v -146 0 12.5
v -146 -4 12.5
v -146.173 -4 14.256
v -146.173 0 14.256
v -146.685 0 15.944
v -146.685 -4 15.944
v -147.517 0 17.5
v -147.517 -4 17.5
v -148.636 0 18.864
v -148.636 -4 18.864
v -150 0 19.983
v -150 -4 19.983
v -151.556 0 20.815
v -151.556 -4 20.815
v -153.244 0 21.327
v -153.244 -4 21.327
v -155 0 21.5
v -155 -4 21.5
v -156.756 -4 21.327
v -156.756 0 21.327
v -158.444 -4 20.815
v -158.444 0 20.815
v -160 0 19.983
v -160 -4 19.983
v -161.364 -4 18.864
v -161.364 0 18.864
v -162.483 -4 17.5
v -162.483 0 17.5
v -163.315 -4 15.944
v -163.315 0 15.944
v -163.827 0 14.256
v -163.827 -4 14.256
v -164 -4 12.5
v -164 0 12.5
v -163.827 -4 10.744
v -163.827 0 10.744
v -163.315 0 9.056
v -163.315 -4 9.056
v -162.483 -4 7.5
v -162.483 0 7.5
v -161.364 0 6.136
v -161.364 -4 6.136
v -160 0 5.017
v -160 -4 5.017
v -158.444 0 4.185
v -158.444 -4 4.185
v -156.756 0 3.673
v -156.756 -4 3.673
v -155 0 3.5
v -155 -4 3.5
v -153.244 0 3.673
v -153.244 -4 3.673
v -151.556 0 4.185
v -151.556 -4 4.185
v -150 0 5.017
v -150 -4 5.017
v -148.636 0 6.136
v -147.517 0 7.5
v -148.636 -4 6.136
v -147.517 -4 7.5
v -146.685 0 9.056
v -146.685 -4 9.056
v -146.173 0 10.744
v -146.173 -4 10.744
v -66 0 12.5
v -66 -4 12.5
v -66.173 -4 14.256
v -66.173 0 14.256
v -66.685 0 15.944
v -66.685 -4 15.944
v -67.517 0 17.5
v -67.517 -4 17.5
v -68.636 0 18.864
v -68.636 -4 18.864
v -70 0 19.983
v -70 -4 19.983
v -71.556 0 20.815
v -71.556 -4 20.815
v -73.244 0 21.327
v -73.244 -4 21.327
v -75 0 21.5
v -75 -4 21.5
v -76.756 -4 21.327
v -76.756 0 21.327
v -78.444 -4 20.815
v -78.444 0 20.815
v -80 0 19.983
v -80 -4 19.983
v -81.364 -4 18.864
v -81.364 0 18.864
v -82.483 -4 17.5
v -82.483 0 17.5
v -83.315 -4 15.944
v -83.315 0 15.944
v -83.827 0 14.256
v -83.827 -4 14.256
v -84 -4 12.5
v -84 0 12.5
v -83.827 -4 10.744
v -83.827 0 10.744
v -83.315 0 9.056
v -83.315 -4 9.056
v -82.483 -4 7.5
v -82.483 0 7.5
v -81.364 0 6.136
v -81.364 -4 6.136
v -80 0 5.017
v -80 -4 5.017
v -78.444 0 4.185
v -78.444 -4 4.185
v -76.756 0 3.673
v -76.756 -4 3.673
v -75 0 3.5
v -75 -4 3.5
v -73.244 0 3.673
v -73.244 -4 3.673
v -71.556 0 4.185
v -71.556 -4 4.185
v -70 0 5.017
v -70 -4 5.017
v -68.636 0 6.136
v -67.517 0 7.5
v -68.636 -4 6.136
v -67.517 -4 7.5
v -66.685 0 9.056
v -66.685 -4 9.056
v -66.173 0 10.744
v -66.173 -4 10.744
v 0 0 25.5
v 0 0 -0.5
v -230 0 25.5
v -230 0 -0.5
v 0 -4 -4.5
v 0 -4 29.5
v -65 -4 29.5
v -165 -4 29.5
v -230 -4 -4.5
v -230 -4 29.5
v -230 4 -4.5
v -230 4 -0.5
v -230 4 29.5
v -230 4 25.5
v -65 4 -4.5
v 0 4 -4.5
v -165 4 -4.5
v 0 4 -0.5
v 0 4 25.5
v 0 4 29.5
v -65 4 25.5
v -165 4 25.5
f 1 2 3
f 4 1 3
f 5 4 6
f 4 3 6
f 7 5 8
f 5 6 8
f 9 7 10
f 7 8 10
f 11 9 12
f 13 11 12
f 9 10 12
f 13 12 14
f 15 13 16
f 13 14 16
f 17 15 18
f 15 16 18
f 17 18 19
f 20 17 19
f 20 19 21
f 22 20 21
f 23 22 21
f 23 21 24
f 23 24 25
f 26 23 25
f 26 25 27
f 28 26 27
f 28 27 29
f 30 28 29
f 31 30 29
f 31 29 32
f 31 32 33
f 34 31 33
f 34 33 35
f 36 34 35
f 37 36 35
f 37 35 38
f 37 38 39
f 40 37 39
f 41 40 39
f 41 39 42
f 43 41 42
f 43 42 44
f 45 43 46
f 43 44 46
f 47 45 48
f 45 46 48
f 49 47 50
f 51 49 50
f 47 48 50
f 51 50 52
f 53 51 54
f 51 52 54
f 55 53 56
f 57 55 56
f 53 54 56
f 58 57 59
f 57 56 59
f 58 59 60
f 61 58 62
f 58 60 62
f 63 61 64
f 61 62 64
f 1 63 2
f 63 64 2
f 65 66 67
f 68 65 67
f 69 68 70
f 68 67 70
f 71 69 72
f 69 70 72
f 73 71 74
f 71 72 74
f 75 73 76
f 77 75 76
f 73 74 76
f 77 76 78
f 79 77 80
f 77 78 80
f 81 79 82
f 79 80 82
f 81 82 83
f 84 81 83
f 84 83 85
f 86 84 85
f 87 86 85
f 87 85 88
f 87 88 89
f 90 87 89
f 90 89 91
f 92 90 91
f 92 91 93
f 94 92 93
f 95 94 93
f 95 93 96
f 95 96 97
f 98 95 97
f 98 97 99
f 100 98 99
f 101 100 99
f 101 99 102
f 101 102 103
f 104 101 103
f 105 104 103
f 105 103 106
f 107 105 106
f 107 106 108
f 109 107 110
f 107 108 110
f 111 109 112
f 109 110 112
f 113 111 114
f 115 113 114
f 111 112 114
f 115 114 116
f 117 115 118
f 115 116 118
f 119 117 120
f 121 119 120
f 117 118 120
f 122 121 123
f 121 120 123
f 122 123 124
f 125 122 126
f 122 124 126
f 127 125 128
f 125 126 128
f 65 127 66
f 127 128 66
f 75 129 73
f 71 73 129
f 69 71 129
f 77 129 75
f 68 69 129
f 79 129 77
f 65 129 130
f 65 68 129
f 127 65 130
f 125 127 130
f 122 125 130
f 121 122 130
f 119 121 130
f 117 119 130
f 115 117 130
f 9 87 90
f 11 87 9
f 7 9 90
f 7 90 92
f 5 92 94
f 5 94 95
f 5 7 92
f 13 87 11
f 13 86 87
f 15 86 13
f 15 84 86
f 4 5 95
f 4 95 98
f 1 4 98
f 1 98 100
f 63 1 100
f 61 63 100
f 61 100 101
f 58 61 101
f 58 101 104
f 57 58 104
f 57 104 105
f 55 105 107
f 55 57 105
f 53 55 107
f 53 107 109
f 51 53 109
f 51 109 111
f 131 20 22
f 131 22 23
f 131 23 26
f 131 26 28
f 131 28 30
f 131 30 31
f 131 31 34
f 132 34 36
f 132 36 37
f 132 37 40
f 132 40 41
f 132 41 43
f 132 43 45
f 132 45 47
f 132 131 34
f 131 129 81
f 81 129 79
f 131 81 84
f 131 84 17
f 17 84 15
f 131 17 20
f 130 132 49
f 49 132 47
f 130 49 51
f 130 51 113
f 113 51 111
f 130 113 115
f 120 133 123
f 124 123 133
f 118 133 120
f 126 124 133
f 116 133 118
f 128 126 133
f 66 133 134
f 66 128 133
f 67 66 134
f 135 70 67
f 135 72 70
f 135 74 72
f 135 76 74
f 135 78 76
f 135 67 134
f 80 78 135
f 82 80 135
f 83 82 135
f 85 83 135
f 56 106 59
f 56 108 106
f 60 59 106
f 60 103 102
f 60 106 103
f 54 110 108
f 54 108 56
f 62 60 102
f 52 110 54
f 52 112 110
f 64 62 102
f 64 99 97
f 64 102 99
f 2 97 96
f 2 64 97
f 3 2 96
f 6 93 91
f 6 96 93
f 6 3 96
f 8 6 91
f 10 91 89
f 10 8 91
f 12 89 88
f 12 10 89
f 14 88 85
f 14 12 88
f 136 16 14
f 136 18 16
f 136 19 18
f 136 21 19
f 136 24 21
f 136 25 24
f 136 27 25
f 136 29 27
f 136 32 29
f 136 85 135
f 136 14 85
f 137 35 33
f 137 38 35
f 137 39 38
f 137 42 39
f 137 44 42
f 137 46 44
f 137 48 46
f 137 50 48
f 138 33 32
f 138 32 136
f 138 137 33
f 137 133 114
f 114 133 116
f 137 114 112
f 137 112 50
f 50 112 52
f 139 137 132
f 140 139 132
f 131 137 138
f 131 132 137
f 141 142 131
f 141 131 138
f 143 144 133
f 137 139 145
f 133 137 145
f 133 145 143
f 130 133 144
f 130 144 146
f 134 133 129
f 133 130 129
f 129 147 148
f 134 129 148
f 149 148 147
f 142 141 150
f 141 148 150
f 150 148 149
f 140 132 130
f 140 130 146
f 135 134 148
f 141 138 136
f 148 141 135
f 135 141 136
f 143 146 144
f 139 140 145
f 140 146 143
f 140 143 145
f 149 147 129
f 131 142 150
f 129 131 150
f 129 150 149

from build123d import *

# Parameters (mm, degrees)
SKETCH5_R               = 9
F_2_STK_18_HULLER_DEPTH = 13.167105011
SKETCH3_W               = 62.936012514
SKETCH3_H               = 32.167105011
DUMMY_CUT_AWAY1_DEPTH   = 35
SKETCH6_W               = 62.936012514
SKETCH6_H               = 32.167105011
DUMMY_CUT_AWAY2_DEPTH   = 35
DUMMY_RET1_DEPTH        = 65


with BuildPart() as part:
    # Sweep1: sweep along a path in Sketch1
    with BuildLine(Plane.XY) as sweep1_path:
        Line((-225.364862075, -4.470649394), (-218.416595736, 1.359638329))
        ThreePointArc((-218.416595736, 1.359638329), (-214.807386139, 3.443416461), (-210.703144419, 4.167105011))
        Line((-210.703144419, 4.167105011), (-188.097668128, 4.167105011))
        ThreePointArc((-188.097668128, 4.167105011), (-186.013889996, 3.984798048), (-183.993426408, 3.443416461))
        Line((-183.993426408, 3.443416461), (-177.3495012, 1.025225447))
        ThreePointArc((-177.3495012, 1.025225447), (-174.487177784, 0.258268199), (-171.535158764, 0))
        Line((-171.535158764, 0), (-58.464841236, 0))
        ThreePointArc((-58.464841236, 0), (-55.512822216, 0.258268199), (-52.6504988, 1.025225447))
        Line((-52.6504988, 1.025225447), (-46.006573592, 3.443416461))
        ThreePointArc((-46.006573592, 3.443416461), (-43.986110004, 3.984798048), (-41.902331872, 4.167105011))
        Line((-41.902331872, 4.167105011), (-19.296855581, 4.167105011))
        ThreePointArc((-19.296855581, 4.167105011), (-15.192613861, 3.443416461), (-11.583404264, 1.359638329))
        Line((-11.583404264, 1.359638329), (-4.635137925, -4.470649394))
    # Sketch2 → Sweep1 (sweep)
    with BuildSketch(Plane(origin=(-4.635137925, -4.470649394, 0), x_dir=(0, 0, -1), z_dir=(0.766044443, -0.64278761, 0))):
        Polygon((0, 0), (0.5, 0), (0.5, 4), (4.5, 4), (4.5, -4), (-29.5, -4), (-29.5, 4), (-25.5, 4), (-25.5, 0), align=None)
    sweep(path=sweep1_path.line)

    # Sketch5 → 2 stk ø18 huller (cut, through all)
    with BuildSketch(Plane.XZ.offset(4)):
        with Locations((-75, 12.5)):
            Circle(SKETCH5_R)
        with Locations((-155, 12.5)):
            Circle(SKETCH5_R)
    extrude(amount=-F_2_STK_18_HULLER_DEPTH, mode=Mode.SUBTRACT)

    # Sketch3 → Dummy cut away1 (cut, through all)
    with BuildSketch(Plane.XY.offset(29.5)):
        with Locations((-33.531993743, 2.083552506)):
            Rectangle(SKETCH3_W, SKETCH3_H)
    extrude(amount=-DUMMY_CUT_AWAY1_DEPTH, mode=Mode.SUBTRACT)

    # Sketch6 → Dummy cut away2 (cut, through all)
    with BuildSketch(Plane.XY.offset(29.5)):
        with Locations((-196.468006257, 2.083552506)):
            Rectangle(SKETCH6_W, SKETCH6_H)
    extrude(amount=-DUMMY_CUT_AWAY2_DEPTH, mode=Mode.SUBTRACT)

    # Sketch4 → Dummy ret1 (add)
    with BuildSketch(Plane.ZY.offset(165)):
        Polygon((29.5, -4), (29.5, 4), (25.5, 4), (25.5, 0), (-0.5, 0), (-0.5, 4), (-4.5, 4), (-4.5, -4), align=None)
    dummy_ret1 = extrude(amount=DUMMY_RET1_DEPTH)

    # Mirror1: Dummy ret1 across plane
    add(dummy_ret1.mirror(Plane(origin=(-115, 4, 29.5), x_dir=(0, 0, 1), z_dir=(-1, 0, 0))))


solid = part.part
